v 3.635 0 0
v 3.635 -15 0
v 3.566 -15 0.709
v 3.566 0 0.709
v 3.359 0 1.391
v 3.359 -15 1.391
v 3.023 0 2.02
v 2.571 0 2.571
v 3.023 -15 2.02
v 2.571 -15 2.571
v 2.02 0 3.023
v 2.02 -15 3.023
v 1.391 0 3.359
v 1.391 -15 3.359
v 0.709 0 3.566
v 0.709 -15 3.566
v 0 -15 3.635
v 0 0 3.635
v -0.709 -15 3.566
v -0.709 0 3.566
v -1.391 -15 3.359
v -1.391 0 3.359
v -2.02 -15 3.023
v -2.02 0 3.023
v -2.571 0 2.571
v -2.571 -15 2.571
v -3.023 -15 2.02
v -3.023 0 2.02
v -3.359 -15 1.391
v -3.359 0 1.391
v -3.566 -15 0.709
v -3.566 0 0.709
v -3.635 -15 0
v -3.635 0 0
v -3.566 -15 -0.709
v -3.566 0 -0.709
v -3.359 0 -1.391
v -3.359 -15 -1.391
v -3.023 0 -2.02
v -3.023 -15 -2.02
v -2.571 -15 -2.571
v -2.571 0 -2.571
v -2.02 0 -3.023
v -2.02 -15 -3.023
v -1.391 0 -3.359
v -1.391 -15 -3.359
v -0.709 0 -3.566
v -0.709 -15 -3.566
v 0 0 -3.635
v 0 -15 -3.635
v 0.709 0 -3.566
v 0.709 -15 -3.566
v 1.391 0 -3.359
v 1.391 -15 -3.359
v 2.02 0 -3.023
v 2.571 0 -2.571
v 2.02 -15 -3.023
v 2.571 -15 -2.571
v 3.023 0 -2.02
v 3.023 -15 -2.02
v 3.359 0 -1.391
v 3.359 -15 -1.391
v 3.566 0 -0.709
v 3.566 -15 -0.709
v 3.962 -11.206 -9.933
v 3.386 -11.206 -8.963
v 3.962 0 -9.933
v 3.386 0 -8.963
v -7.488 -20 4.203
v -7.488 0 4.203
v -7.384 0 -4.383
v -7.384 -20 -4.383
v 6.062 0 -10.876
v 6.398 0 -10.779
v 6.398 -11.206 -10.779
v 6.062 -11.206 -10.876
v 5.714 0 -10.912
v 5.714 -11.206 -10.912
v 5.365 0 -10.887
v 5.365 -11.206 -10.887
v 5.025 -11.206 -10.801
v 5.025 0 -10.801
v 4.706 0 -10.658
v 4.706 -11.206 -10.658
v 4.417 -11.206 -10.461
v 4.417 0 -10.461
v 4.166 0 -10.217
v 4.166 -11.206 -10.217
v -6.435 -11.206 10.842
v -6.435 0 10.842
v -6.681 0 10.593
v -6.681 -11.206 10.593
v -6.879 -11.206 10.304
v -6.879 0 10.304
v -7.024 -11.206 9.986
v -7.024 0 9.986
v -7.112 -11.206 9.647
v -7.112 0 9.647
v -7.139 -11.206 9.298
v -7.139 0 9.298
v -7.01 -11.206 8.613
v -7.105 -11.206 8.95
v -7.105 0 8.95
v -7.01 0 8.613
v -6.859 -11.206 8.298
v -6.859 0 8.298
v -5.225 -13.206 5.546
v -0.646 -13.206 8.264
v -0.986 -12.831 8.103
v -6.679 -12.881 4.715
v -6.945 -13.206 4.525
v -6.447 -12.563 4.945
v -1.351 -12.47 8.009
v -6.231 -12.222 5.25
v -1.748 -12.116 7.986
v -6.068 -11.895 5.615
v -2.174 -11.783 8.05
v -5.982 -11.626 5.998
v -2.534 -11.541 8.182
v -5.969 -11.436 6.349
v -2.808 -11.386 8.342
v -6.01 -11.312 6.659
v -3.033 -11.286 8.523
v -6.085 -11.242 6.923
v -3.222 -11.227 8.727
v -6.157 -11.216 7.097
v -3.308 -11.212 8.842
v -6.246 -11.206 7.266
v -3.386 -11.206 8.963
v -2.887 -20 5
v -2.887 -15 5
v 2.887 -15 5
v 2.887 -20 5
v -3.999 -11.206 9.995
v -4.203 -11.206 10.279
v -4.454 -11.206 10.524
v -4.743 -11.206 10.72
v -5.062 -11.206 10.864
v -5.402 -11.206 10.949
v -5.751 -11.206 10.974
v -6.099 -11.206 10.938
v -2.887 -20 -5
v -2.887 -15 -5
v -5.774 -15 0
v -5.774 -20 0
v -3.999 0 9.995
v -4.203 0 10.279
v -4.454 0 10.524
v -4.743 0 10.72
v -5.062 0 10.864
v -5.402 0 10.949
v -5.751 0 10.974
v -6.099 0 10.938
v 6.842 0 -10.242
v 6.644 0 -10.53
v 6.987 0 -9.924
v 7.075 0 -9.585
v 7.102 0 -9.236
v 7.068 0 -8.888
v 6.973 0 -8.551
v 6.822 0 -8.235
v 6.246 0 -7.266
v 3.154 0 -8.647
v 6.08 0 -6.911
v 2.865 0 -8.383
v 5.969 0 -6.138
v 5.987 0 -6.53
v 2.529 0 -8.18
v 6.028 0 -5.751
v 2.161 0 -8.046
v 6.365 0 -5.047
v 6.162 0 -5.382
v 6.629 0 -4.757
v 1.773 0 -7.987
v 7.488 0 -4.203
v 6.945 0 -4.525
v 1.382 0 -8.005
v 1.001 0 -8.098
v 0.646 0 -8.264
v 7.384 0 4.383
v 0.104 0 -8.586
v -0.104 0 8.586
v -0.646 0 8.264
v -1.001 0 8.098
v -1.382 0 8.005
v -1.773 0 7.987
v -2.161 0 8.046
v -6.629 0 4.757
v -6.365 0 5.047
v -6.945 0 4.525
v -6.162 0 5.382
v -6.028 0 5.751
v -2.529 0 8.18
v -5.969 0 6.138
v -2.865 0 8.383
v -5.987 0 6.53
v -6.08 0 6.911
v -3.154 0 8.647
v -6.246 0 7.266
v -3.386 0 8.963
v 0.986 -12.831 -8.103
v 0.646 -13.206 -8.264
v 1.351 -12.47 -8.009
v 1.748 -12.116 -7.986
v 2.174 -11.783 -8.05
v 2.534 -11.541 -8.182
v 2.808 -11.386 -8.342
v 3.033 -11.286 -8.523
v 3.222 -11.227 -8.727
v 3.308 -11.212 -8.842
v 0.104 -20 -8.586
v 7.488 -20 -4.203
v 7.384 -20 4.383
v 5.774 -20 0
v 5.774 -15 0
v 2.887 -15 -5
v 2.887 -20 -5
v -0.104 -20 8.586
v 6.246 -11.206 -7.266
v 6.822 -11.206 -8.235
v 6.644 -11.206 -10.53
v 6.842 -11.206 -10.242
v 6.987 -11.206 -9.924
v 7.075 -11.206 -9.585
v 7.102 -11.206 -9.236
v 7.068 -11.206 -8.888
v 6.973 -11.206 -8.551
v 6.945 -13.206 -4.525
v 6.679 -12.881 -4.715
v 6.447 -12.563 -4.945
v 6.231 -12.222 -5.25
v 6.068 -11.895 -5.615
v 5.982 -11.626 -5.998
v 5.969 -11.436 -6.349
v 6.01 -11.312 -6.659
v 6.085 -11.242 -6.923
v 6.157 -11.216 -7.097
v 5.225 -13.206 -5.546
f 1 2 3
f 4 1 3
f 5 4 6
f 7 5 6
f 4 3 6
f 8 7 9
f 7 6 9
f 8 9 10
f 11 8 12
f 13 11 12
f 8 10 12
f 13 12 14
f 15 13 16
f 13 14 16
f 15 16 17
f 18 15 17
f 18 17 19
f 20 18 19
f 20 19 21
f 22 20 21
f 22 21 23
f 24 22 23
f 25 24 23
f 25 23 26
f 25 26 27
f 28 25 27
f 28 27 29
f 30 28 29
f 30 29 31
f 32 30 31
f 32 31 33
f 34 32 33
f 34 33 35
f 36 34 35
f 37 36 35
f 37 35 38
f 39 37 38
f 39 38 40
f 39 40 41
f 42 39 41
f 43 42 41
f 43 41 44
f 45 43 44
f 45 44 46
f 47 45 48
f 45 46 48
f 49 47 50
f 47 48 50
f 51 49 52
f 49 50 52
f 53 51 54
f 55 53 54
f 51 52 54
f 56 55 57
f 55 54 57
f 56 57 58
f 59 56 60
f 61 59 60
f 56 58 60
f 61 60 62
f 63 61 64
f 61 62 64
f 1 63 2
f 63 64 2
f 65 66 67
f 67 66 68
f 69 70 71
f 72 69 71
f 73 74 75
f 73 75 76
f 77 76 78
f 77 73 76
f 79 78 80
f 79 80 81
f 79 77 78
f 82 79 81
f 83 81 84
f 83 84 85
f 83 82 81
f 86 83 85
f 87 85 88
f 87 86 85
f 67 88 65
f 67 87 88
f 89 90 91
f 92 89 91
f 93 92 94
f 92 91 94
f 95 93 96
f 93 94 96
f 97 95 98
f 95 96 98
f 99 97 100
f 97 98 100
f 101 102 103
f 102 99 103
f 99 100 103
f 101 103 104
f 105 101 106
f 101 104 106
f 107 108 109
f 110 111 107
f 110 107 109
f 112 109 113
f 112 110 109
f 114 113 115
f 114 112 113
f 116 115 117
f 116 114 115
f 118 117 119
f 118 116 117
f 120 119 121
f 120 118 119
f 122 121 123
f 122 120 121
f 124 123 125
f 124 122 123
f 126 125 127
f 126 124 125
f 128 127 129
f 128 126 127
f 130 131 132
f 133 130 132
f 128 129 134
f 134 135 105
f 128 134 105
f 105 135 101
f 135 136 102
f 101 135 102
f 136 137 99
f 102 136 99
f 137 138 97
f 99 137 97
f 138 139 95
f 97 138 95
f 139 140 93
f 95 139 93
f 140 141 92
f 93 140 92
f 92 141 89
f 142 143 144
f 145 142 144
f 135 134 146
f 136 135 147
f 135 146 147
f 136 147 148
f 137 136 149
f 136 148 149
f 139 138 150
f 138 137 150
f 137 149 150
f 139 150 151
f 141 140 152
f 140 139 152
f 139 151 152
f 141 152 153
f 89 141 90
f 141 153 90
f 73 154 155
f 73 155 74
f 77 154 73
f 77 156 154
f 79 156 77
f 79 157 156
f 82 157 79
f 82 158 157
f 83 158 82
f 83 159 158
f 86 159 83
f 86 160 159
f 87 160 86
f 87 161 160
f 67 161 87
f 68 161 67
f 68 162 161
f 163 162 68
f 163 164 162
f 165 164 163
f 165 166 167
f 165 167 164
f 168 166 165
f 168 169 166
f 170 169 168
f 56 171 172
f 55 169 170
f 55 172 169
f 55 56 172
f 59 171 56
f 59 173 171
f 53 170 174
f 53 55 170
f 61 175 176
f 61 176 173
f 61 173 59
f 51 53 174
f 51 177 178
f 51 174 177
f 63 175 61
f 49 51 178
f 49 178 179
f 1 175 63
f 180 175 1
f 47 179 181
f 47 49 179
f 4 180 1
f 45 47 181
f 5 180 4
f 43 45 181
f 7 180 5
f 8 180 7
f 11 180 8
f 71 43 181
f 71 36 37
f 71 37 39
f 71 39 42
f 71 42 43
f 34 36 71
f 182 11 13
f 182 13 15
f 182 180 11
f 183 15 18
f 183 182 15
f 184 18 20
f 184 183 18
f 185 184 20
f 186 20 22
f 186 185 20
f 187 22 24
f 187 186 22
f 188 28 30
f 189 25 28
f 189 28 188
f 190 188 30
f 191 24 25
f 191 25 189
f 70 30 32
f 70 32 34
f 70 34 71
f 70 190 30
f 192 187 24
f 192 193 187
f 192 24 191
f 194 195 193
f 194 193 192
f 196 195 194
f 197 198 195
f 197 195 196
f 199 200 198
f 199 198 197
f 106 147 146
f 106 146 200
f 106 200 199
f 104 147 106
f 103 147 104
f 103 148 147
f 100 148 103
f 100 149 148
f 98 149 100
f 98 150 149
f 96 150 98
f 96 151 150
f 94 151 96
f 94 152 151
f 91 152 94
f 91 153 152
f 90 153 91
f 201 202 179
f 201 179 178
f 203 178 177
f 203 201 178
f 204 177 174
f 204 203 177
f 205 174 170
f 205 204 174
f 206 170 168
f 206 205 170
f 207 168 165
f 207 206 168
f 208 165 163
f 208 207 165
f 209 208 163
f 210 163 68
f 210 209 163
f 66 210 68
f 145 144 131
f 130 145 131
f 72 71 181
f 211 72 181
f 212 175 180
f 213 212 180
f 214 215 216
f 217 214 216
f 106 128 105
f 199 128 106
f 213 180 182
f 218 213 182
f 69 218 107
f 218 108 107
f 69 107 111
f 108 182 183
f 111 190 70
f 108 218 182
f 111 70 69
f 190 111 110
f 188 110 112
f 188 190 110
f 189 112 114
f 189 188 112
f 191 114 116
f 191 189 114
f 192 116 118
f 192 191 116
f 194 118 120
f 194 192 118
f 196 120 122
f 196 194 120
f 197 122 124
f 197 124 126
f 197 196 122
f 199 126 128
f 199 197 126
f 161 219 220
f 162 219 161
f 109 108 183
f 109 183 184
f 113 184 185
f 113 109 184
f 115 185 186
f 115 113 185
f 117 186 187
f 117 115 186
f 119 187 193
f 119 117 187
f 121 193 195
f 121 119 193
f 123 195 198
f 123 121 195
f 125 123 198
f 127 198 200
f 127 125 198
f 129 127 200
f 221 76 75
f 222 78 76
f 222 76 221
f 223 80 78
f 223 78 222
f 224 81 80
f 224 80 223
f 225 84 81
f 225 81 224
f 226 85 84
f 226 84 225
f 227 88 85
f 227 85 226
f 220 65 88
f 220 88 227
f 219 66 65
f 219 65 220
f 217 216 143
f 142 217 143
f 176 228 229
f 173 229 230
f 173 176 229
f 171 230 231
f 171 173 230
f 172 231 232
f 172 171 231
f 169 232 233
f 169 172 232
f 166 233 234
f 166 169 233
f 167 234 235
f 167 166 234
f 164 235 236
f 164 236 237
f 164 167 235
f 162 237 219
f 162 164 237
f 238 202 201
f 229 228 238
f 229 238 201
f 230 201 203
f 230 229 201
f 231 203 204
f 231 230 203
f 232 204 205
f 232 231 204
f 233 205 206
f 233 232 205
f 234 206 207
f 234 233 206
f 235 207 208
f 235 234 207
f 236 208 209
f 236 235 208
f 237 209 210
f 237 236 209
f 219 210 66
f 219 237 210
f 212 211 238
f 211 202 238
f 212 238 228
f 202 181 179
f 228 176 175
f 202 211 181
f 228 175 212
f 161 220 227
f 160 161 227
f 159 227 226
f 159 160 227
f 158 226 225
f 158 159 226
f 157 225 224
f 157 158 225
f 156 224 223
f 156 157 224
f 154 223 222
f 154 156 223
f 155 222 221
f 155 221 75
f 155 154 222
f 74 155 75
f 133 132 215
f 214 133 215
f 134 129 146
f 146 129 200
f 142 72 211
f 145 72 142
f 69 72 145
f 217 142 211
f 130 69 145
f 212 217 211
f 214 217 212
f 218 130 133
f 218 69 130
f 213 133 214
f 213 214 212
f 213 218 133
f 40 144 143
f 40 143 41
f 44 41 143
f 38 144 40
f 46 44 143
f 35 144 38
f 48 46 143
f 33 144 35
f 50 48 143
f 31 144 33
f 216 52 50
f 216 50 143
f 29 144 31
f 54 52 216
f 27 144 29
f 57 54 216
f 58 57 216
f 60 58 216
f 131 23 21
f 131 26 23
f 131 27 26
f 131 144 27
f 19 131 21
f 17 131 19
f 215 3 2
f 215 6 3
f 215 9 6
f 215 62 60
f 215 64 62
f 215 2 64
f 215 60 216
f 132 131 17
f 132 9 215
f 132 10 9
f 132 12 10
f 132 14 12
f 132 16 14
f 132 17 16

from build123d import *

# Parameters (mm, degrees)
F1_DEPTH      = 20
F2_DEPTH      = 15
F4_W          = 3.3256819006
F4_H          = 11.2064601853
F5_DEPTH      = 5.2
F5_DEPTH_BACK = 20
F3_R          = 3.6353661433
F6_DEPTH      = 25
F7_T1_DEPTH   = 11.2064601853
F7_T3_DEPTH   = 3.3256819006
F7_T5_DEPTH   = 3.3256819006
F7_T11_DEPTH  = 8.3256819006
F7_T16_DEPTH  = 16.2064601853
F7_T23_DEPTH  = 16.2064601853
F7_T27_DEPTH  = 8.3256819006
F7_T35_DEPTH  = 8.3256819006
F7_T40_DEPTH  = 16.2064601853
F7_T47_DEPTH  = 16.2064601853
F7_T51_DEPTH  = 8.3256819006
F7_T55_DEPTH  = 21.2064601853


# Not quite as in the source:
# - a fillet or chamfer that OpenCascade refuses, or shapes differently, is made with other operations: its cross-section is extruded or revolved along the edge and cut away or added


with BuildPart() as f1:
    # F0 (on Front) → F1 (new body)
    with BuildSketch(Plane.XZ):
        Polygon((7.3840099636, 4.3827313822), (-0.1035517331, 8.5861059014), (-7.4875616967, 4.2033745192), (-7.3840099636, -4.3827313822), (0.1035517331, -8.5861059014), (7.4875616967, -4.2033745192), align=None)
        Polygon((-2.8867513459, 5), (2.8867513459, 5), (5.7735026919, 0), (2.8867513459, -5), (-2.8867513459, -5), (-5.7735026919, 0), align=None, mode=Mode.SUBTRACT)
    extrude(amount=F1_DEPTH)

    # F0 (on Front) → F2 (join)
    with BuildSketch(Plane.XZ):
        Polygon((5.7735026919, 0), (2.8867513459, 5), (-2.8867513459, 5), (-5.7735026919, 0), (-2.8867513459, -5), (2.8867513459, -5), align=None)
    extrude(amount=F2_DEPTH)

    # F4 (on face) → F5 (join, two sides)
    with BuildSketch(Plane(origin=(-3.7955567149, 0, 6.3947402103), x_dir=(0.8599326743, 0, 0.51040748), z_dir=(-0.51040748, 0, 0.8599326743))) as f5_sk:
        with Locations((0, -5.6032300927)):
            Rectangle(F4_W, F4_H)
    extrude(amount=F5_DEPTH)
    extrude(f5_sk.sketch, amount=-F5_DEPTH_BACK)

    # F3 (on face) → F6 (cut)
    with BuildSketch(Plane.XZ.offset(15)):
        Circle(F3_R)
    extrude(amount=-F6_DEPTH, mode=Mode.SUBTRACT)

    # F7: fillet of radius 2 on 10 edges, made by hand

    # F7_s2 → F7_t1 (join)
    with BuildSketch(Plane.XZ):
        with BuildLine():
            ThreePointArc((-6.9453533288, 4.525198791), (-6.0282146576, 5.7507608695), (-6.2463029403, 7.2658790997))
            Line((-6.2463029403, 7.2658790997), (-5.2254879802, 5.5460137511))
            Line((-5.2254879802, 5.5460137511), (-6.9453533288, 4.525198791))
        make_face()
        with BuildLine():
            ThreePointArc((-0.645760101, 8.2642816296), (-2.1608783312, 8.0461933468), (-3.3864404097, 8.963332018))
            Line((-3.3864404097, 8.963332018), (-2.3656254496, 7.2434666695))
            Line((-2.3656254496, 7.2434666695), (-0.645760101, 8.2642816296))
        make_face()
        with BuildLine():
            ThreePointArc((6.9453533288, -4.525198791), (6.0282146576, -5.7507608695), (6.2463029403, -7.2658790997))
            Line((6.2463029403, -7.2658790997), (5.2254879802, -5.5460137511))
            Line((5.2254879802, -5.5460137511), (6.9453533288, -4.525198791))
        make_face()
        with BuildLine():
            ThreePointArc((0.645760101, -8.2642816296), (2.1608783312, -8.0461933468), (3.3864404097, -8.963332018))
            Line((3.3864404097, -8.963332018), (2.3656254496, -7.2434666695))
            Line((2.3656254496, -7.2434666695), (0.645760101, -8.2642816296))
        make_face()
    extrude(amount=F7_T1_DEPTH)

    # F7_s4 → F7_t3 (join)
    with BuildSketch(Plane(origin=(-1.4299312653, 0, -0.8487264592), x_dir=(0, 1, 0), z_dir=(0.8599326743, 0, 0.51040748))):
        with BuildLine():
            ThreePointArc((-13.2064601853, 7.4363265887), (-11.792246623, 8.0221130263), (-11.2064601853, 9.4363265887))
            Line((-11.2064601853, 9.4363265887), (-11.2064601853, 7.4363265887))
            Line((-11.2064601853, 7.4363265887), (-13.2064601853, 7.4363265887))
        make_face()
    extrude(amount=F7_T3_DEPTH)

    # F7_s6 → F7_t5 (join)
    with BuildSketch(Plane(origin=(1.4299312653, 0, 0.8487264592), x_dir=(0, 1, 0), z_dir=(-0.8599326743, 0, -0.51040748))):
        with BuildLine():
            ThreePointArc((-13.2064601853, 7.4363265887), (-11.792246623, 8.0221130263), (-11.2064601853, 9.4363265887))
            Line((-11.2064601853, 9.4363265887), (-11.2064601853, 7.4363265887))
            Line((-11.2064601853, 7.4363265887), (-13.2064601853, 7.4363265887))
        make_face()
    extrude(amount=F7_T5_DEPTH)


with BuildPart() as f7_tool9:
    # F7_s10 → F7_t11 (new body)
    with BuildSketch(Plane(origin=(-5.7295946368, 0, -3.4007638594), x_dir=(0, 1, 0), z_dir=(0.8599326743, 0, 0.51040748))):
        with BuildLine():
            ThreePointArc((-13.2064601853, 7.4363265887), (-11.792246623, 8.0221130263), (-11.2064601853, 9.4363265887))
            Line((-11.2064601853, 9.4363265887), (-11.2064601853, 7.4363265887))
            Line((-11.2064601853, 7.4363265887), (-13.2064601853, 7.4363265887))
        make_face()
    extrude(amount=F7_T11_DEPTH)

    split(bisect_by=Plane(origin=(-7.4357858302, 0, -0.0896784315), x_dir=(0, 1, 0), z_dir=(0.9999272815, 0, 0.0120595069)), keep=Keep.TOP)

    split(bisect_by=Plane(origin=(-1.4299312653, 0, -0.8487264592), x_dir=(0, 1, 0), z_dir=(-0.8599326743, 0, -0.51040748)), keep=Keep.TOP)


with BuildPart() as f7_tool14:
    # F7_s15 → F7_t16 (new body)
    with BuildSketch(Plane.XZ):
        with BuildLine():
            ThreePointArc((-6.9453533288, 4.525198791), (-6.0282146576, 5.7507608695), (-6.2463029403, 7.2658790997))
            Line((-6.2463029403, 7.2658790997), (-5.2254879802, 5.5460137511))
            Line((-5.2254879802, 5.5460137511), (-6.9453533288, 4.525198791))
        make_face()
    extrude(amount=F7_T16_DEPTH)

    split(bisect_by=Plane.XZ.offset(11.2064601853), keep=Keep.TOP)


with BuildPart() as f7_tool9_1:
    add(f7_tool9.part)

    # F7_t18: intersect F7_tool14
    add(f7_tool14.part, mode=Mode.INTERSECT)


with BuildPart() as f1_1:
    add(f1.part)

    # F7_t7: union F7_tool9
    add(f7_tool9_1.part)


with BuildPart() as f7_tool21:
    # F7_s22 → F7_t23 (new body)
    with BuildSketch(Plane.XZ.offset(16.2064601853)):
        with BuildLine():
            ThreePointArc((-0.645760101, 8.2642816296), (-2.1608783312, 8.0461933468), (-3.3864404097, 8.963332018))
            Line((-3.3864404097, 8.963332018), (-2.3656254496, 7.2434666695))
            Line((-2.3656254496, 7.2434666695), (-0.645760101, 8.2642816296))
        make_face()
    extrude(amount=-F7_T23_DEPTH)

    split(bisect_by=Plane.XZ.offset(11.2064601853), keep=Keep.TOP)


with BuildPart() as f7_tool25:
    # F7_s26 → F7_t27 (new body)
    with BuildSketch(Plane(origin=(-1.4299312653, 0, -0.8487264592), x_dir=(0, 1, 0), z_dir=(0.8599326743, 0, 0.51040748))):
        with BuildLine():
            ThreePointArc((-13.2064601853, 7.4363265887), (-11.792246623, 8.0221130263), (-11.2064601853, 9.4363265887))
            Line((-11.2064601853, 9.4363265887), (-11.2064601853, 7.4363265887))
            Line((-11.2064601853, 7.4363265887), (-13.2064601853, 7.4363265887))
        make_face()
    extrude(amount=F7_T27_DEPTH)

    split(bisect_by=Plane(origin=(3.6402291153, 0, 6.4844186418), x_dir=(0, 1, 0), z_dir=(-0.4895198015, 0, -0.8719921811)), keep=Keep.TOP)

    split(bisect_by=Plane(origin=(1.4299312653, 0, 0.8487264592), x_dir=(0, 1, 0), z_dir=(0.8599326743, 0, 0.51040748)), keep=Keep.TOP)


with BuildPart() as f7_tool21_1:
    add(f7_tool21.part)

    # F7_t30: intersect F7_tool25
    add(f7_tool25.part, mode=Mode.INTERSECT)


with BuildPart() as f1_2:
    add(f1_1.part)

    # F7_t19: union F7_tool21
    add(f7_tool21_1.part)


with BuildPart() as f7_tool33:
    # F7_s34 → F7_t35 (new body)
    with BuildSketch(Plane(origin=(5.7295946368, 0, 3.4007638594), x_dir=(0, 1, 0), z_dir=(-0.8599326743, 0, -0.51040748))):
        with BuildLine():
            ThreePointArc((-13.2064601853, 7.4363265887), (-11.792246623, 8.0221130263), (-11.2064601853, 9.4363265887))
            Line((-11.2064601853, 9.4363265887), (-11.2064601853, 7.4363265887))
            Line((-11.2064601853, 7.4363265887), (-13.2064601853, 7.4363265887))
        make_face()
    extrude(amount=F7_T35_DEPTH)

    split(bisect_by=Plane(origin=(7.4357858302, 0, 0.0896784315), x_dir=(0, 1, 0), z_dir=(-0.9999272815, 0, -0.0120595069)), keep=Keep.TOP)

    split(bisect_by=Plane(origin=(1.4299312653, 0, 0.8487264592), x_dir=(0, 1, 0), z_dir=(0.8599326743, 0, 0.51040748)), keep=Keep.TOP)


with BuildPart() as f7_tool38:
    # F7_s39 → F7_t40 (new body)
    with BuildSketch(Plane.XZ):
        with BuildLine():
            ThreePointArc((6.9453533288, -4.525198791), (6.0282146576, -5.7507608695), (6.2463029403, -7.2658790997))
            Line((6.2463029403, -7.2658790997), (5.2254879802, -5.5460137511))
            Line((5.2254879802, -5.5460137511), (6.9453533288, -4.525198791))
        make_face()
    extrude(amount=F7_T40_DEPTH)

    split(bisect_by=Plane.XZ.offset(11.2064601853), keep=Keep.TOP)


with BuildPart() as f7_tool33_1:
    add(f7_tool33.part)

    # F7_t42: intersect F7_tool38
    add(f7_tool38.part, mode=Mode.INTERSECT)


with BuildPart() as f1_3:
    add(f1_2.part)

    # F7_t31: union F7_tool33
    add(f7_tool33_1.part)


with BuildPart() as f7_tool45:
    # F7_s46 → F7_t47 (new body)
    with BuildSketch(Plane.XZ.offset(16.2064601853)):
        with BuildLine():
            ThreePointArc((0.645760101, -8.2642816296), (2.1608783312, -8.0461933468), (3.3864404097, -8.963332018))
            Line((3.3864404097, -8.963332018), (2.3656254496, -7.2434666695))
            Line((2.3656254496, -7.2434666695), (0.645760101, -8.2642816296))
        make_face()
    extrude(amount=-F7_T47_DEPTH)

    split(bisect_by=Plane.XZ.offset(11.2064601853), keep=Keep.TOP)


with BuildPart() as f7_tool49:
    # F7_s50 → F7_t51 (new body)
    with BuildSketch(Plane(origin=(1.4299312653, 0, 0.8487264592), x_dir=(0, 1, 0), z_dir=(-0.8599326743, 0, -0.51040748))):
        with BuildLine():
            ThreePointArc((-13.2064601853, 7.4363265887), (-11.792246623, 8.0221130263), (-11.2064601853, 9.4363265887))
            Line((-11.2064601853, 9.4363265887), (-11.2064601853, 7.4363265887))
            Line((-11.2064601853, 7.4363265887), (-13.2064601853, 7.4363265887))
        make_face()
    extrude(amount=F7_T51_DEPTH)

    split(bisect_by=Plane(origin=(-3.6402291153, 0, -6.4844186418), x_dir=(0, 1, 0), z_dir=(0.4895198015, 0, 0.8719921811)), keep=Keep.TOP)

    split(bisect_by=Plane(origin=(-1.4299312653, 0, -0.8487264592), x_dir=(0, 1, 0), z_dir=(-0.8599326743, 0, -0.51040748)), keep=Keep.TOP)


with BuildPart() as f7_tool45_1:
    add(f7_tool45.part)

    # F7_t54: intersect F7_tool49
    add(f7_tool49.part, mode=Mode.INTERSECT)


with BuildPart() as f1_4:
    add(f1_3.part)

    # F7_t43: union F7_tool45
    add(f7_tool45_1.part)

    # F7_s56 → F7_t55 (cut)
    with BuildSketch(Plane.XZ.offset(-5)):
        with BuildLine():
            ThreePointArc((-6.1597415279, 11.0384786175), (-7.0768801991, 9.8129165391), (-6.8587919164, 8.2977983089))
            Line((-6.8587919164, 8.2977983089), (-7.8796068765, 10.0176636575))
            Line((-7.8796068765, 10.0176636575), (-6.1597415279, 11.0384786175))
        make_face()
        with BuildLine():
            ThreePointArc((-3.9989293858, 9.9952512272), (-5.2244914642, 10.9123898984), (-6.7396096944, 10.6943016157))
            Line((-6.7396096944, 10.6943016157), (-5.0197443458, 11.7151165758))
            Line((-5.0197443458, 11.7151165758), (-3.9989293858, 9.9952512272))
        make_face()
        with BuildLine():
            ThreePointArc((6.7025269693, -10.6318247746), (5.1874087391, -10.8499130573), (3.9618466606, -9.9327743861))
            Line((3.9618466606, -9.9327743861), (4.9826616207, -11.6526397347))
            Line((4.9826616207, -11.6526397347), (6.7025269693, -10.6318247746))
        make_face()
        with BuildLine():
            ThreePointArc((6.8217091912, -8.2353214678), (7.039797474, -9.750439698), (6.1226588027, -10.9760017765))
            Line((6.1226588027, -10.9760017765), (7.8425241513, -9.9551868164))
            Line((7.8425241513, -9.9551868164), (6.8217091912, -8.2353214678))
        make_face()
    extrude(amount=F7_T55_DEPTH, mode=Mode.SUBTRACT)


solid = f1_4.part
